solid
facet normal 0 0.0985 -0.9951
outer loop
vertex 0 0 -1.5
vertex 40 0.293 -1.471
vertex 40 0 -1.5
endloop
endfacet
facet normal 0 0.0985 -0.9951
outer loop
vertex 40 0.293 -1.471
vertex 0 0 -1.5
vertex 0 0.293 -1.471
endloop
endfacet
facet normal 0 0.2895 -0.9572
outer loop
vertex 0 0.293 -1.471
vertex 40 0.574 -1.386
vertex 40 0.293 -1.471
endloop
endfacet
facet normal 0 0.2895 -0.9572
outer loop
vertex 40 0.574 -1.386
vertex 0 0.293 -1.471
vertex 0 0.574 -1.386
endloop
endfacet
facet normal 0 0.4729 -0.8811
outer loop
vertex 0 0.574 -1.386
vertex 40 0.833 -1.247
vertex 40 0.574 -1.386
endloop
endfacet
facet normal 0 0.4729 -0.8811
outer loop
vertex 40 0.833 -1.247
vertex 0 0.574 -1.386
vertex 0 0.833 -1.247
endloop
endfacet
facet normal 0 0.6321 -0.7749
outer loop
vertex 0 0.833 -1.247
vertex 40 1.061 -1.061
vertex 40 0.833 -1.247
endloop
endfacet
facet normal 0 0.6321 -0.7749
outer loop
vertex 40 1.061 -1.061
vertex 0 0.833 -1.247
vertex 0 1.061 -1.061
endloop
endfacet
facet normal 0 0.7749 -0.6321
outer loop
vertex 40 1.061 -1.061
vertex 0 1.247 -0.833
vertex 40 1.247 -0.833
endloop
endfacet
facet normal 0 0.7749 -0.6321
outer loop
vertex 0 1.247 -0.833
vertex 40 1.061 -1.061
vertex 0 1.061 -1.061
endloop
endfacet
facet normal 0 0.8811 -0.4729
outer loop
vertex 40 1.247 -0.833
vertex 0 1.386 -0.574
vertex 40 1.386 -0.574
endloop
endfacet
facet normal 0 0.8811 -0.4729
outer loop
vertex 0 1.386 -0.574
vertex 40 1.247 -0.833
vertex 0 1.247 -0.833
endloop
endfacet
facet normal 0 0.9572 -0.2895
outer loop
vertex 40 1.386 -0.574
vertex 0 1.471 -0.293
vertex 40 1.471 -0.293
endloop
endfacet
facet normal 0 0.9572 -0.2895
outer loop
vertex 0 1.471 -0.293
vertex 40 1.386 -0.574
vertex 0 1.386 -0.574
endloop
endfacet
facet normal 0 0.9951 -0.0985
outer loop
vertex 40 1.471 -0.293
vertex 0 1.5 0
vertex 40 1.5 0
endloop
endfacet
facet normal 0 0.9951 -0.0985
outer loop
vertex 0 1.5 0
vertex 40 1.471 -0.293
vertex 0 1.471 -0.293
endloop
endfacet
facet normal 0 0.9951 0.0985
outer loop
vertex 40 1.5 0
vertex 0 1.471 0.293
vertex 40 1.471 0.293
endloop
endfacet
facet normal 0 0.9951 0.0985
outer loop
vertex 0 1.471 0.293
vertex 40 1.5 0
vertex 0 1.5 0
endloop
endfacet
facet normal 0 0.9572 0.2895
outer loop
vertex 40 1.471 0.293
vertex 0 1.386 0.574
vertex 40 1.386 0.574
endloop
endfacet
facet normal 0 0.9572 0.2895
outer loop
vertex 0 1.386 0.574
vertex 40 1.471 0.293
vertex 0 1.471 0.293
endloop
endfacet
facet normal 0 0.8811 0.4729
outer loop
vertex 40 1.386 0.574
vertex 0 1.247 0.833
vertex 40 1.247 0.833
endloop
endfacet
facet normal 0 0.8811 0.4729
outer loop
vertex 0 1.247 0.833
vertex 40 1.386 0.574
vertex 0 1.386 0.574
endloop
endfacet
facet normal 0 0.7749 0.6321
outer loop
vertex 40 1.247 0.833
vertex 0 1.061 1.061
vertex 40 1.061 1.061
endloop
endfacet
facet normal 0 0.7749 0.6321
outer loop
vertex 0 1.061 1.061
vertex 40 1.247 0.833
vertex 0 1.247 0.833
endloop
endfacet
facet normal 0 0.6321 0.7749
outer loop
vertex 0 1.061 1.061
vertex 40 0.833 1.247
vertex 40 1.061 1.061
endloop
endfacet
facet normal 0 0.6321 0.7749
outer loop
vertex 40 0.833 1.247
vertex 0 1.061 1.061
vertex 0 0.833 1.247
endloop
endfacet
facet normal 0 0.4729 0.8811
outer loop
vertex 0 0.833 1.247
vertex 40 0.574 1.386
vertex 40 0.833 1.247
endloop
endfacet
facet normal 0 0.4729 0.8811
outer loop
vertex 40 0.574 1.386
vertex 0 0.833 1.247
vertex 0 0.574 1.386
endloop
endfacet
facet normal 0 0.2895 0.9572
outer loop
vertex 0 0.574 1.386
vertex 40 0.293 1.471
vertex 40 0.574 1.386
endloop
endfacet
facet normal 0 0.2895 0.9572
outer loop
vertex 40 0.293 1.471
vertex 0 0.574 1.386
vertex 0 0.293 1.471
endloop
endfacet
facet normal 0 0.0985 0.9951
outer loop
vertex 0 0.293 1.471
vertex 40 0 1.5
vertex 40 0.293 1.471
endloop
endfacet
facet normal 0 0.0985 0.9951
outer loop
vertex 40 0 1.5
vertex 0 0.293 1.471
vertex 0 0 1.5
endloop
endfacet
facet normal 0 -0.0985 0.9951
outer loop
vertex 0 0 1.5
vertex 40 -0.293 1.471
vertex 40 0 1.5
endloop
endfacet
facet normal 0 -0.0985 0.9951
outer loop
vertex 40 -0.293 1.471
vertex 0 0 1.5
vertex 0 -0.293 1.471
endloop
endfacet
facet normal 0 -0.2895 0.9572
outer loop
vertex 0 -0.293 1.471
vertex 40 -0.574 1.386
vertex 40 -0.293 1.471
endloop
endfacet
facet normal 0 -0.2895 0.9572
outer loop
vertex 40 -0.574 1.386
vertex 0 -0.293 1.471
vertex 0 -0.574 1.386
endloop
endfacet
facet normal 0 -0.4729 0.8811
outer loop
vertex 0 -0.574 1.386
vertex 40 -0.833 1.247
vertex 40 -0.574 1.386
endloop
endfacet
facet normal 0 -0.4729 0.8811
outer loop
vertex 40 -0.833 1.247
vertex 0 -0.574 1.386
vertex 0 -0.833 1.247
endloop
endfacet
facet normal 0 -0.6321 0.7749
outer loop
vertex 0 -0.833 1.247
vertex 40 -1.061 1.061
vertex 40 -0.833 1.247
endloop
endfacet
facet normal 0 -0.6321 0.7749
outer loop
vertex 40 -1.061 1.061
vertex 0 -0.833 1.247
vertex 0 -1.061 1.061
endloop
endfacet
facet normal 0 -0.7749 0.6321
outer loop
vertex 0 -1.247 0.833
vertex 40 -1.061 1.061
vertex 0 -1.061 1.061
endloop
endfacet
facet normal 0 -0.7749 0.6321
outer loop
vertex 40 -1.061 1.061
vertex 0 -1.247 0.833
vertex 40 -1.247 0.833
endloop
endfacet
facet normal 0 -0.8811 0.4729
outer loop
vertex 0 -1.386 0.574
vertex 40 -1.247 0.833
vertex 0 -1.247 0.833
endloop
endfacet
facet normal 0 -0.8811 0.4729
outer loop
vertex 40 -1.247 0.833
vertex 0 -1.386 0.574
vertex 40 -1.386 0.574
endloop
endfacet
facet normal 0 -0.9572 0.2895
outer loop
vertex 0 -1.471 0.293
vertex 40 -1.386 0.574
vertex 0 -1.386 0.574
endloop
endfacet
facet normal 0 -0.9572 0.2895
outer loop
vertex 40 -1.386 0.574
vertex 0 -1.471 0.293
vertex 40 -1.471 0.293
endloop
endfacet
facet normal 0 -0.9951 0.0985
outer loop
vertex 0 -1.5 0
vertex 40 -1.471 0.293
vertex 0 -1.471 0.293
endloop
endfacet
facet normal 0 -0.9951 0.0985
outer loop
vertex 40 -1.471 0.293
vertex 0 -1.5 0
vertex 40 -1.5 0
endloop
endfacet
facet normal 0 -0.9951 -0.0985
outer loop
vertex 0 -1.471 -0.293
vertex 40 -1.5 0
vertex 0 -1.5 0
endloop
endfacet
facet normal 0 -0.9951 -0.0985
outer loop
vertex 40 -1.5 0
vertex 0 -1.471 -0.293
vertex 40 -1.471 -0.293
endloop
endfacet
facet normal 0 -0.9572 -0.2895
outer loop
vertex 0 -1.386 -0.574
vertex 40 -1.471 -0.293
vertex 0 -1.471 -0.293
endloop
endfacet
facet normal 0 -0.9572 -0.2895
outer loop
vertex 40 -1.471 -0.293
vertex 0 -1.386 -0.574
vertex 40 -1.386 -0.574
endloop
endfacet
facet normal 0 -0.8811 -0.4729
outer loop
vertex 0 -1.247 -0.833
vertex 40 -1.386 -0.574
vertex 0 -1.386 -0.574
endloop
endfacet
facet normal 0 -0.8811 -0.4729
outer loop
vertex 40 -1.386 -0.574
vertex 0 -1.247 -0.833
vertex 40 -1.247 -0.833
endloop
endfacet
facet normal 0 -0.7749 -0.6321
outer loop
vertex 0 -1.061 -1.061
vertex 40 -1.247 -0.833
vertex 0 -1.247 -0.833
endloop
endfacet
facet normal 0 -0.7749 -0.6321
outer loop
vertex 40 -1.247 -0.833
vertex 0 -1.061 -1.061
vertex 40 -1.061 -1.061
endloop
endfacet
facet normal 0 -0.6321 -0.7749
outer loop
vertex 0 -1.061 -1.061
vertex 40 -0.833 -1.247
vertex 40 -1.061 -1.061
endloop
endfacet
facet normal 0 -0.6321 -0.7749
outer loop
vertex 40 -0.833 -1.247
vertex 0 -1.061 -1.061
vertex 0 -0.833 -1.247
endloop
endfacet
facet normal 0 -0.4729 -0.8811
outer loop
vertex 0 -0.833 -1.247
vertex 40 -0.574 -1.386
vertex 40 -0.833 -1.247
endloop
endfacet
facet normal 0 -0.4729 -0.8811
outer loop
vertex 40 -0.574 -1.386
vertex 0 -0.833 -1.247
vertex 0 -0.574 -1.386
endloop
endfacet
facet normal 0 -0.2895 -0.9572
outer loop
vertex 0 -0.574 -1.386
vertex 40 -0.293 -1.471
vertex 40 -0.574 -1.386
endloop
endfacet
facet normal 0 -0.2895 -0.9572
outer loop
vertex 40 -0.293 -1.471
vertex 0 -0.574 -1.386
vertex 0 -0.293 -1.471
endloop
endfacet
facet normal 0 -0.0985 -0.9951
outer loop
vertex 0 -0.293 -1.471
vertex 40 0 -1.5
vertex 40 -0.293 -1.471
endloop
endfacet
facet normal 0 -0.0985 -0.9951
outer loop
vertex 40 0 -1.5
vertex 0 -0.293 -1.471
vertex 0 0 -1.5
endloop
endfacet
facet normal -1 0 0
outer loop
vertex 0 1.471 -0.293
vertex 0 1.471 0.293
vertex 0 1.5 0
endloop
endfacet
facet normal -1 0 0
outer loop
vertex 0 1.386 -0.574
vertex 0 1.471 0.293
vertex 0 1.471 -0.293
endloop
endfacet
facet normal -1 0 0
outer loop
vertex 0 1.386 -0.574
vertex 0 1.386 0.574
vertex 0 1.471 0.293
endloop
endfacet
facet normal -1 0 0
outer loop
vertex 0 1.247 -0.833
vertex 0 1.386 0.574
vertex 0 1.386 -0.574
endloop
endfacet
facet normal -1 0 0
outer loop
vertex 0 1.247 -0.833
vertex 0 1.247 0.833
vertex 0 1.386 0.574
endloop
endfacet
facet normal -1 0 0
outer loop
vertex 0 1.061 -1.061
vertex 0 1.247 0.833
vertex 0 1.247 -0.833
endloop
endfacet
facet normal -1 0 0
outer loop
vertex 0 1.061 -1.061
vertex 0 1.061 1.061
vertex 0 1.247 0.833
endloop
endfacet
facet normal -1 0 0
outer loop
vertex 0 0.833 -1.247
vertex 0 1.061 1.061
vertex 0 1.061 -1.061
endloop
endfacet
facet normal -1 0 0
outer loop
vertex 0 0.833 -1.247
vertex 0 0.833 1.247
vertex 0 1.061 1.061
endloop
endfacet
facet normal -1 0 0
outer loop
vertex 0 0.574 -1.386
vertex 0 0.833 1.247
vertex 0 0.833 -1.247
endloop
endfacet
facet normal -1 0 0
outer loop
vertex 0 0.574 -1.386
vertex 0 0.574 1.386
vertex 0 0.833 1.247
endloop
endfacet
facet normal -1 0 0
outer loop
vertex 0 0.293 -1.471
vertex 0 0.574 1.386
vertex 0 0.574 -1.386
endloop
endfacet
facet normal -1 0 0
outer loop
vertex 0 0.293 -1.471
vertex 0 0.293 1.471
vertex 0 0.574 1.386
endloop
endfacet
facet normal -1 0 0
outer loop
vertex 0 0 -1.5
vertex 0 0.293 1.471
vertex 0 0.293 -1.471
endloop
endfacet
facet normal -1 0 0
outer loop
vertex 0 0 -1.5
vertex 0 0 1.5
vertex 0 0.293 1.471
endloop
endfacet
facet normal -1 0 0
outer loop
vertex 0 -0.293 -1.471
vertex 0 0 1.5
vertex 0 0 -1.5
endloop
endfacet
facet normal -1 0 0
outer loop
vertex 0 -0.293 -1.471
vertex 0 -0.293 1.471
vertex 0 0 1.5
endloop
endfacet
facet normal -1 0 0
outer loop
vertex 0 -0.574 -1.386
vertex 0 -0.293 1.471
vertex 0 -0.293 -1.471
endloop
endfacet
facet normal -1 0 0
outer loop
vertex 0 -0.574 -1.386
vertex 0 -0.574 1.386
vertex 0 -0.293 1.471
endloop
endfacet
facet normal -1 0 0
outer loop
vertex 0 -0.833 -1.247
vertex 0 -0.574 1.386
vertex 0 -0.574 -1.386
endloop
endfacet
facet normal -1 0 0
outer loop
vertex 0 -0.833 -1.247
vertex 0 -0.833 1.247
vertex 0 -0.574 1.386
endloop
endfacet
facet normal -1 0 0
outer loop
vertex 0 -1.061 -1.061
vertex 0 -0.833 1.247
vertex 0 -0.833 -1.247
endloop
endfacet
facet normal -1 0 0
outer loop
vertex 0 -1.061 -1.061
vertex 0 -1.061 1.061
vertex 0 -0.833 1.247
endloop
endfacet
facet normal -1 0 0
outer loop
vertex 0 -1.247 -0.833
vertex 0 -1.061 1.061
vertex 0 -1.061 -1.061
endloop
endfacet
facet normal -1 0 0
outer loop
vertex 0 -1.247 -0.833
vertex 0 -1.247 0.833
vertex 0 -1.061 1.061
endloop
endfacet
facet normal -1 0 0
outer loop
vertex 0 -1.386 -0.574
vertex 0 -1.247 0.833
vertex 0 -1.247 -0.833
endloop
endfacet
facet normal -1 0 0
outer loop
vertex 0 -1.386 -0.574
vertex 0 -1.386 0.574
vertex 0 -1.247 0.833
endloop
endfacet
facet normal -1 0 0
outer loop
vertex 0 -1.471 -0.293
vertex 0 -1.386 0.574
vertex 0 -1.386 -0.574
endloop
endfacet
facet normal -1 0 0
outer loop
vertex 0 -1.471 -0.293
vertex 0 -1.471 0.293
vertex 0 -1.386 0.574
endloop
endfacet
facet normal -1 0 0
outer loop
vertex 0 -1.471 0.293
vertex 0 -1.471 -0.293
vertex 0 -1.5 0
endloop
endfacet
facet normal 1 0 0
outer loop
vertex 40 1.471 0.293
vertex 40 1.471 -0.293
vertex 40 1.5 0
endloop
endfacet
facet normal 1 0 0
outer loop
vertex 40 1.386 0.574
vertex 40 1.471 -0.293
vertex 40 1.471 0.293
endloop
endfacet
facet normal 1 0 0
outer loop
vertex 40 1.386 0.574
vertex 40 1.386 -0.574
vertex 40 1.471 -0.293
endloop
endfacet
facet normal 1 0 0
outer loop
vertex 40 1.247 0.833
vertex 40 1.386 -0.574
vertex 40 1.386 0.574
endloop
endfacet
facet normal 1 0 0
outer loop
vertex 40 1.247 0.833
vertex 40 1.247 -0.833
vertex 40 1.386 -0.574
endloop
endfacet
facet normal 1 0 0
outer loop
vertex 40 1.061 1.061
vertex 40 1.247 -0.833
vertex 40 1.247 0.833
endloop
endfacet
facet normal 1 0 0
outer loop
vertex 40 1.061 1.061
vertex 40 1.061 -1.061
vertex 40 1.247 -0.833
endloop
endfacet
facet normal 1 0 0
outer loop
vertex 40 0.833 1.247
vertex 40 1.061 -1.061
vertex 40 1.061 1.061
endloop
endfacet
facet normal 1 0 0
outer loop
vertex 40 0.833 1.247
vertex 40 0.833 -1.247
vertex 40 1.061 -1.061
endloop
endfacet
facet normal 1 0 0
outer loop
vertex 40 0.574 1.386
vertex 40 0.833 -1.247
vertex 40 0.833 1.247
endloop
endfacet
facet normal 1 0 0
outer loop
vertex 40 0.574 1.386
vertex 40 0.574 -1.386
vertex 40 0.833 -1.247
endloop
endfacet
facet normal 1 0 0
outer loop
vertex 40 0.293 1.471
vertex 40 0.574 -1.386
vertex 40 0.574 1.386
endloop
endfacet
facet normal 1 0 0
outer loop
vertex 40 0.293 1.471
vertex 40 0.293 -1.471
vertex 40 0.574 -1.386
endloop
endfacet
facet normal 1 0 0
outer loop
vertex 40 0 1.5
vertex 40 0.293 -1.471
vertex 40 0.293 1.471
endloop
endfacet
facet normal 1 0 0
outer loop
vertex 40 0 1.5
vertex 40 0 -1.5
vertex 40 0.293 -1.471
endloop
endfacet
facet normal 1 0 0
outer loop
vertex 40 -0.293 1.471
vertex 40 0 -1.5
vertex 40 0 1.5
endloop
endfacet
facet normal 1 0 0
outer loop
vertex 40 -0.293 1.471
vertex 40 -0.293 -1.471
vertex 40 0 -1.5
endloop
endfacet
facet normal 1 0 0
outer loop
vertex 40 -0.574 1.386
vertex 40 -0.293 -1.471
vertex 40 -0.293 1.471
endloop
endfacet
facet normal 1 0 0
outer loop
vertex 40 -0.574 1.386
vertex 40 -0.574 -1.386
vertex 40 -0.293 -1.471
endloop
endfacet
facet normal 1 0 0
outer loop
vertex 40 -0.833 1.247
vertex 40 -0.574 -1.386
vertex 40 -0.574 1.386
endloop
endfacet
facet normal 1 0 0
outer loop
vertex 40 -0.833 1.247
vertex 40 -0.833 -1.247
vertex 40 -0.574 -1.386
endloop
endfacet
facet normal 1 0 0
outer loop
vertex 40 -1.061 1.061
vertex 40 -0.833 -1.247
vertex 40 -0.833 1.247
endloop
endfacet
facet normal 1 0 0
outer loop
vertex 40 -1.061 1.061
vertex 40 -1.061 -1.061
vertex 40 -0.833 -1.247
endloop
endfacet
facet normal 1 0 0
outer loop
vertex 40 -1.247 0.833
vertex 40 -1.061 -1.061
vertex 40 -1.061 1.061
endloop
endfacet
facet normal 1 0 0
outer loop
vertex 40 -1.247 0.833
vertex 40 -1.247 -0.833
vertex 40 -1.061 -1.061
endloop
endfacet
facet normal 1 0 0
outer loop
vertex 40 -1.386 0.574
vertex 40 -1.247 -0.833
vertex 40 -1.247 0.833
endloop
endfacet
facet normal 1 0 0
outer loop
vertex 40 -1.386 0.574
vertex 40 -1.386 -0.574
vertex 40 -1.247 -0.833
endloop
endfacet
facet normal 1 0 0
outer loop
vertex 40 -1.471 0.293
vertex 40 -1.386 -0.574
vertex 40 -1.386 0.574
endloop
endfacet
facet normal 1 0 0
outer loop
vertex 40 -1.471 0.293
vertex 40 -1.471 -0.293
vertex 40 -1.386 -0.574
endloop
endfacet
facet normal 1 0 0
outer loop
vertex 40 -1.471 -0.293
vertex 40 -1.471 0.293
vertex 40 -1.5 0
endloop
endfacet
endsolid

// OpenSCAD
$fn = 32;

radius = 1.5;
height = 40;

num = 1;

for (i=[0:num-1]) {
    
    translate([0, i*(radius * 3),0])
    rotate([0,90,0])
    cylinder(r=radius, h=height);
    
}
